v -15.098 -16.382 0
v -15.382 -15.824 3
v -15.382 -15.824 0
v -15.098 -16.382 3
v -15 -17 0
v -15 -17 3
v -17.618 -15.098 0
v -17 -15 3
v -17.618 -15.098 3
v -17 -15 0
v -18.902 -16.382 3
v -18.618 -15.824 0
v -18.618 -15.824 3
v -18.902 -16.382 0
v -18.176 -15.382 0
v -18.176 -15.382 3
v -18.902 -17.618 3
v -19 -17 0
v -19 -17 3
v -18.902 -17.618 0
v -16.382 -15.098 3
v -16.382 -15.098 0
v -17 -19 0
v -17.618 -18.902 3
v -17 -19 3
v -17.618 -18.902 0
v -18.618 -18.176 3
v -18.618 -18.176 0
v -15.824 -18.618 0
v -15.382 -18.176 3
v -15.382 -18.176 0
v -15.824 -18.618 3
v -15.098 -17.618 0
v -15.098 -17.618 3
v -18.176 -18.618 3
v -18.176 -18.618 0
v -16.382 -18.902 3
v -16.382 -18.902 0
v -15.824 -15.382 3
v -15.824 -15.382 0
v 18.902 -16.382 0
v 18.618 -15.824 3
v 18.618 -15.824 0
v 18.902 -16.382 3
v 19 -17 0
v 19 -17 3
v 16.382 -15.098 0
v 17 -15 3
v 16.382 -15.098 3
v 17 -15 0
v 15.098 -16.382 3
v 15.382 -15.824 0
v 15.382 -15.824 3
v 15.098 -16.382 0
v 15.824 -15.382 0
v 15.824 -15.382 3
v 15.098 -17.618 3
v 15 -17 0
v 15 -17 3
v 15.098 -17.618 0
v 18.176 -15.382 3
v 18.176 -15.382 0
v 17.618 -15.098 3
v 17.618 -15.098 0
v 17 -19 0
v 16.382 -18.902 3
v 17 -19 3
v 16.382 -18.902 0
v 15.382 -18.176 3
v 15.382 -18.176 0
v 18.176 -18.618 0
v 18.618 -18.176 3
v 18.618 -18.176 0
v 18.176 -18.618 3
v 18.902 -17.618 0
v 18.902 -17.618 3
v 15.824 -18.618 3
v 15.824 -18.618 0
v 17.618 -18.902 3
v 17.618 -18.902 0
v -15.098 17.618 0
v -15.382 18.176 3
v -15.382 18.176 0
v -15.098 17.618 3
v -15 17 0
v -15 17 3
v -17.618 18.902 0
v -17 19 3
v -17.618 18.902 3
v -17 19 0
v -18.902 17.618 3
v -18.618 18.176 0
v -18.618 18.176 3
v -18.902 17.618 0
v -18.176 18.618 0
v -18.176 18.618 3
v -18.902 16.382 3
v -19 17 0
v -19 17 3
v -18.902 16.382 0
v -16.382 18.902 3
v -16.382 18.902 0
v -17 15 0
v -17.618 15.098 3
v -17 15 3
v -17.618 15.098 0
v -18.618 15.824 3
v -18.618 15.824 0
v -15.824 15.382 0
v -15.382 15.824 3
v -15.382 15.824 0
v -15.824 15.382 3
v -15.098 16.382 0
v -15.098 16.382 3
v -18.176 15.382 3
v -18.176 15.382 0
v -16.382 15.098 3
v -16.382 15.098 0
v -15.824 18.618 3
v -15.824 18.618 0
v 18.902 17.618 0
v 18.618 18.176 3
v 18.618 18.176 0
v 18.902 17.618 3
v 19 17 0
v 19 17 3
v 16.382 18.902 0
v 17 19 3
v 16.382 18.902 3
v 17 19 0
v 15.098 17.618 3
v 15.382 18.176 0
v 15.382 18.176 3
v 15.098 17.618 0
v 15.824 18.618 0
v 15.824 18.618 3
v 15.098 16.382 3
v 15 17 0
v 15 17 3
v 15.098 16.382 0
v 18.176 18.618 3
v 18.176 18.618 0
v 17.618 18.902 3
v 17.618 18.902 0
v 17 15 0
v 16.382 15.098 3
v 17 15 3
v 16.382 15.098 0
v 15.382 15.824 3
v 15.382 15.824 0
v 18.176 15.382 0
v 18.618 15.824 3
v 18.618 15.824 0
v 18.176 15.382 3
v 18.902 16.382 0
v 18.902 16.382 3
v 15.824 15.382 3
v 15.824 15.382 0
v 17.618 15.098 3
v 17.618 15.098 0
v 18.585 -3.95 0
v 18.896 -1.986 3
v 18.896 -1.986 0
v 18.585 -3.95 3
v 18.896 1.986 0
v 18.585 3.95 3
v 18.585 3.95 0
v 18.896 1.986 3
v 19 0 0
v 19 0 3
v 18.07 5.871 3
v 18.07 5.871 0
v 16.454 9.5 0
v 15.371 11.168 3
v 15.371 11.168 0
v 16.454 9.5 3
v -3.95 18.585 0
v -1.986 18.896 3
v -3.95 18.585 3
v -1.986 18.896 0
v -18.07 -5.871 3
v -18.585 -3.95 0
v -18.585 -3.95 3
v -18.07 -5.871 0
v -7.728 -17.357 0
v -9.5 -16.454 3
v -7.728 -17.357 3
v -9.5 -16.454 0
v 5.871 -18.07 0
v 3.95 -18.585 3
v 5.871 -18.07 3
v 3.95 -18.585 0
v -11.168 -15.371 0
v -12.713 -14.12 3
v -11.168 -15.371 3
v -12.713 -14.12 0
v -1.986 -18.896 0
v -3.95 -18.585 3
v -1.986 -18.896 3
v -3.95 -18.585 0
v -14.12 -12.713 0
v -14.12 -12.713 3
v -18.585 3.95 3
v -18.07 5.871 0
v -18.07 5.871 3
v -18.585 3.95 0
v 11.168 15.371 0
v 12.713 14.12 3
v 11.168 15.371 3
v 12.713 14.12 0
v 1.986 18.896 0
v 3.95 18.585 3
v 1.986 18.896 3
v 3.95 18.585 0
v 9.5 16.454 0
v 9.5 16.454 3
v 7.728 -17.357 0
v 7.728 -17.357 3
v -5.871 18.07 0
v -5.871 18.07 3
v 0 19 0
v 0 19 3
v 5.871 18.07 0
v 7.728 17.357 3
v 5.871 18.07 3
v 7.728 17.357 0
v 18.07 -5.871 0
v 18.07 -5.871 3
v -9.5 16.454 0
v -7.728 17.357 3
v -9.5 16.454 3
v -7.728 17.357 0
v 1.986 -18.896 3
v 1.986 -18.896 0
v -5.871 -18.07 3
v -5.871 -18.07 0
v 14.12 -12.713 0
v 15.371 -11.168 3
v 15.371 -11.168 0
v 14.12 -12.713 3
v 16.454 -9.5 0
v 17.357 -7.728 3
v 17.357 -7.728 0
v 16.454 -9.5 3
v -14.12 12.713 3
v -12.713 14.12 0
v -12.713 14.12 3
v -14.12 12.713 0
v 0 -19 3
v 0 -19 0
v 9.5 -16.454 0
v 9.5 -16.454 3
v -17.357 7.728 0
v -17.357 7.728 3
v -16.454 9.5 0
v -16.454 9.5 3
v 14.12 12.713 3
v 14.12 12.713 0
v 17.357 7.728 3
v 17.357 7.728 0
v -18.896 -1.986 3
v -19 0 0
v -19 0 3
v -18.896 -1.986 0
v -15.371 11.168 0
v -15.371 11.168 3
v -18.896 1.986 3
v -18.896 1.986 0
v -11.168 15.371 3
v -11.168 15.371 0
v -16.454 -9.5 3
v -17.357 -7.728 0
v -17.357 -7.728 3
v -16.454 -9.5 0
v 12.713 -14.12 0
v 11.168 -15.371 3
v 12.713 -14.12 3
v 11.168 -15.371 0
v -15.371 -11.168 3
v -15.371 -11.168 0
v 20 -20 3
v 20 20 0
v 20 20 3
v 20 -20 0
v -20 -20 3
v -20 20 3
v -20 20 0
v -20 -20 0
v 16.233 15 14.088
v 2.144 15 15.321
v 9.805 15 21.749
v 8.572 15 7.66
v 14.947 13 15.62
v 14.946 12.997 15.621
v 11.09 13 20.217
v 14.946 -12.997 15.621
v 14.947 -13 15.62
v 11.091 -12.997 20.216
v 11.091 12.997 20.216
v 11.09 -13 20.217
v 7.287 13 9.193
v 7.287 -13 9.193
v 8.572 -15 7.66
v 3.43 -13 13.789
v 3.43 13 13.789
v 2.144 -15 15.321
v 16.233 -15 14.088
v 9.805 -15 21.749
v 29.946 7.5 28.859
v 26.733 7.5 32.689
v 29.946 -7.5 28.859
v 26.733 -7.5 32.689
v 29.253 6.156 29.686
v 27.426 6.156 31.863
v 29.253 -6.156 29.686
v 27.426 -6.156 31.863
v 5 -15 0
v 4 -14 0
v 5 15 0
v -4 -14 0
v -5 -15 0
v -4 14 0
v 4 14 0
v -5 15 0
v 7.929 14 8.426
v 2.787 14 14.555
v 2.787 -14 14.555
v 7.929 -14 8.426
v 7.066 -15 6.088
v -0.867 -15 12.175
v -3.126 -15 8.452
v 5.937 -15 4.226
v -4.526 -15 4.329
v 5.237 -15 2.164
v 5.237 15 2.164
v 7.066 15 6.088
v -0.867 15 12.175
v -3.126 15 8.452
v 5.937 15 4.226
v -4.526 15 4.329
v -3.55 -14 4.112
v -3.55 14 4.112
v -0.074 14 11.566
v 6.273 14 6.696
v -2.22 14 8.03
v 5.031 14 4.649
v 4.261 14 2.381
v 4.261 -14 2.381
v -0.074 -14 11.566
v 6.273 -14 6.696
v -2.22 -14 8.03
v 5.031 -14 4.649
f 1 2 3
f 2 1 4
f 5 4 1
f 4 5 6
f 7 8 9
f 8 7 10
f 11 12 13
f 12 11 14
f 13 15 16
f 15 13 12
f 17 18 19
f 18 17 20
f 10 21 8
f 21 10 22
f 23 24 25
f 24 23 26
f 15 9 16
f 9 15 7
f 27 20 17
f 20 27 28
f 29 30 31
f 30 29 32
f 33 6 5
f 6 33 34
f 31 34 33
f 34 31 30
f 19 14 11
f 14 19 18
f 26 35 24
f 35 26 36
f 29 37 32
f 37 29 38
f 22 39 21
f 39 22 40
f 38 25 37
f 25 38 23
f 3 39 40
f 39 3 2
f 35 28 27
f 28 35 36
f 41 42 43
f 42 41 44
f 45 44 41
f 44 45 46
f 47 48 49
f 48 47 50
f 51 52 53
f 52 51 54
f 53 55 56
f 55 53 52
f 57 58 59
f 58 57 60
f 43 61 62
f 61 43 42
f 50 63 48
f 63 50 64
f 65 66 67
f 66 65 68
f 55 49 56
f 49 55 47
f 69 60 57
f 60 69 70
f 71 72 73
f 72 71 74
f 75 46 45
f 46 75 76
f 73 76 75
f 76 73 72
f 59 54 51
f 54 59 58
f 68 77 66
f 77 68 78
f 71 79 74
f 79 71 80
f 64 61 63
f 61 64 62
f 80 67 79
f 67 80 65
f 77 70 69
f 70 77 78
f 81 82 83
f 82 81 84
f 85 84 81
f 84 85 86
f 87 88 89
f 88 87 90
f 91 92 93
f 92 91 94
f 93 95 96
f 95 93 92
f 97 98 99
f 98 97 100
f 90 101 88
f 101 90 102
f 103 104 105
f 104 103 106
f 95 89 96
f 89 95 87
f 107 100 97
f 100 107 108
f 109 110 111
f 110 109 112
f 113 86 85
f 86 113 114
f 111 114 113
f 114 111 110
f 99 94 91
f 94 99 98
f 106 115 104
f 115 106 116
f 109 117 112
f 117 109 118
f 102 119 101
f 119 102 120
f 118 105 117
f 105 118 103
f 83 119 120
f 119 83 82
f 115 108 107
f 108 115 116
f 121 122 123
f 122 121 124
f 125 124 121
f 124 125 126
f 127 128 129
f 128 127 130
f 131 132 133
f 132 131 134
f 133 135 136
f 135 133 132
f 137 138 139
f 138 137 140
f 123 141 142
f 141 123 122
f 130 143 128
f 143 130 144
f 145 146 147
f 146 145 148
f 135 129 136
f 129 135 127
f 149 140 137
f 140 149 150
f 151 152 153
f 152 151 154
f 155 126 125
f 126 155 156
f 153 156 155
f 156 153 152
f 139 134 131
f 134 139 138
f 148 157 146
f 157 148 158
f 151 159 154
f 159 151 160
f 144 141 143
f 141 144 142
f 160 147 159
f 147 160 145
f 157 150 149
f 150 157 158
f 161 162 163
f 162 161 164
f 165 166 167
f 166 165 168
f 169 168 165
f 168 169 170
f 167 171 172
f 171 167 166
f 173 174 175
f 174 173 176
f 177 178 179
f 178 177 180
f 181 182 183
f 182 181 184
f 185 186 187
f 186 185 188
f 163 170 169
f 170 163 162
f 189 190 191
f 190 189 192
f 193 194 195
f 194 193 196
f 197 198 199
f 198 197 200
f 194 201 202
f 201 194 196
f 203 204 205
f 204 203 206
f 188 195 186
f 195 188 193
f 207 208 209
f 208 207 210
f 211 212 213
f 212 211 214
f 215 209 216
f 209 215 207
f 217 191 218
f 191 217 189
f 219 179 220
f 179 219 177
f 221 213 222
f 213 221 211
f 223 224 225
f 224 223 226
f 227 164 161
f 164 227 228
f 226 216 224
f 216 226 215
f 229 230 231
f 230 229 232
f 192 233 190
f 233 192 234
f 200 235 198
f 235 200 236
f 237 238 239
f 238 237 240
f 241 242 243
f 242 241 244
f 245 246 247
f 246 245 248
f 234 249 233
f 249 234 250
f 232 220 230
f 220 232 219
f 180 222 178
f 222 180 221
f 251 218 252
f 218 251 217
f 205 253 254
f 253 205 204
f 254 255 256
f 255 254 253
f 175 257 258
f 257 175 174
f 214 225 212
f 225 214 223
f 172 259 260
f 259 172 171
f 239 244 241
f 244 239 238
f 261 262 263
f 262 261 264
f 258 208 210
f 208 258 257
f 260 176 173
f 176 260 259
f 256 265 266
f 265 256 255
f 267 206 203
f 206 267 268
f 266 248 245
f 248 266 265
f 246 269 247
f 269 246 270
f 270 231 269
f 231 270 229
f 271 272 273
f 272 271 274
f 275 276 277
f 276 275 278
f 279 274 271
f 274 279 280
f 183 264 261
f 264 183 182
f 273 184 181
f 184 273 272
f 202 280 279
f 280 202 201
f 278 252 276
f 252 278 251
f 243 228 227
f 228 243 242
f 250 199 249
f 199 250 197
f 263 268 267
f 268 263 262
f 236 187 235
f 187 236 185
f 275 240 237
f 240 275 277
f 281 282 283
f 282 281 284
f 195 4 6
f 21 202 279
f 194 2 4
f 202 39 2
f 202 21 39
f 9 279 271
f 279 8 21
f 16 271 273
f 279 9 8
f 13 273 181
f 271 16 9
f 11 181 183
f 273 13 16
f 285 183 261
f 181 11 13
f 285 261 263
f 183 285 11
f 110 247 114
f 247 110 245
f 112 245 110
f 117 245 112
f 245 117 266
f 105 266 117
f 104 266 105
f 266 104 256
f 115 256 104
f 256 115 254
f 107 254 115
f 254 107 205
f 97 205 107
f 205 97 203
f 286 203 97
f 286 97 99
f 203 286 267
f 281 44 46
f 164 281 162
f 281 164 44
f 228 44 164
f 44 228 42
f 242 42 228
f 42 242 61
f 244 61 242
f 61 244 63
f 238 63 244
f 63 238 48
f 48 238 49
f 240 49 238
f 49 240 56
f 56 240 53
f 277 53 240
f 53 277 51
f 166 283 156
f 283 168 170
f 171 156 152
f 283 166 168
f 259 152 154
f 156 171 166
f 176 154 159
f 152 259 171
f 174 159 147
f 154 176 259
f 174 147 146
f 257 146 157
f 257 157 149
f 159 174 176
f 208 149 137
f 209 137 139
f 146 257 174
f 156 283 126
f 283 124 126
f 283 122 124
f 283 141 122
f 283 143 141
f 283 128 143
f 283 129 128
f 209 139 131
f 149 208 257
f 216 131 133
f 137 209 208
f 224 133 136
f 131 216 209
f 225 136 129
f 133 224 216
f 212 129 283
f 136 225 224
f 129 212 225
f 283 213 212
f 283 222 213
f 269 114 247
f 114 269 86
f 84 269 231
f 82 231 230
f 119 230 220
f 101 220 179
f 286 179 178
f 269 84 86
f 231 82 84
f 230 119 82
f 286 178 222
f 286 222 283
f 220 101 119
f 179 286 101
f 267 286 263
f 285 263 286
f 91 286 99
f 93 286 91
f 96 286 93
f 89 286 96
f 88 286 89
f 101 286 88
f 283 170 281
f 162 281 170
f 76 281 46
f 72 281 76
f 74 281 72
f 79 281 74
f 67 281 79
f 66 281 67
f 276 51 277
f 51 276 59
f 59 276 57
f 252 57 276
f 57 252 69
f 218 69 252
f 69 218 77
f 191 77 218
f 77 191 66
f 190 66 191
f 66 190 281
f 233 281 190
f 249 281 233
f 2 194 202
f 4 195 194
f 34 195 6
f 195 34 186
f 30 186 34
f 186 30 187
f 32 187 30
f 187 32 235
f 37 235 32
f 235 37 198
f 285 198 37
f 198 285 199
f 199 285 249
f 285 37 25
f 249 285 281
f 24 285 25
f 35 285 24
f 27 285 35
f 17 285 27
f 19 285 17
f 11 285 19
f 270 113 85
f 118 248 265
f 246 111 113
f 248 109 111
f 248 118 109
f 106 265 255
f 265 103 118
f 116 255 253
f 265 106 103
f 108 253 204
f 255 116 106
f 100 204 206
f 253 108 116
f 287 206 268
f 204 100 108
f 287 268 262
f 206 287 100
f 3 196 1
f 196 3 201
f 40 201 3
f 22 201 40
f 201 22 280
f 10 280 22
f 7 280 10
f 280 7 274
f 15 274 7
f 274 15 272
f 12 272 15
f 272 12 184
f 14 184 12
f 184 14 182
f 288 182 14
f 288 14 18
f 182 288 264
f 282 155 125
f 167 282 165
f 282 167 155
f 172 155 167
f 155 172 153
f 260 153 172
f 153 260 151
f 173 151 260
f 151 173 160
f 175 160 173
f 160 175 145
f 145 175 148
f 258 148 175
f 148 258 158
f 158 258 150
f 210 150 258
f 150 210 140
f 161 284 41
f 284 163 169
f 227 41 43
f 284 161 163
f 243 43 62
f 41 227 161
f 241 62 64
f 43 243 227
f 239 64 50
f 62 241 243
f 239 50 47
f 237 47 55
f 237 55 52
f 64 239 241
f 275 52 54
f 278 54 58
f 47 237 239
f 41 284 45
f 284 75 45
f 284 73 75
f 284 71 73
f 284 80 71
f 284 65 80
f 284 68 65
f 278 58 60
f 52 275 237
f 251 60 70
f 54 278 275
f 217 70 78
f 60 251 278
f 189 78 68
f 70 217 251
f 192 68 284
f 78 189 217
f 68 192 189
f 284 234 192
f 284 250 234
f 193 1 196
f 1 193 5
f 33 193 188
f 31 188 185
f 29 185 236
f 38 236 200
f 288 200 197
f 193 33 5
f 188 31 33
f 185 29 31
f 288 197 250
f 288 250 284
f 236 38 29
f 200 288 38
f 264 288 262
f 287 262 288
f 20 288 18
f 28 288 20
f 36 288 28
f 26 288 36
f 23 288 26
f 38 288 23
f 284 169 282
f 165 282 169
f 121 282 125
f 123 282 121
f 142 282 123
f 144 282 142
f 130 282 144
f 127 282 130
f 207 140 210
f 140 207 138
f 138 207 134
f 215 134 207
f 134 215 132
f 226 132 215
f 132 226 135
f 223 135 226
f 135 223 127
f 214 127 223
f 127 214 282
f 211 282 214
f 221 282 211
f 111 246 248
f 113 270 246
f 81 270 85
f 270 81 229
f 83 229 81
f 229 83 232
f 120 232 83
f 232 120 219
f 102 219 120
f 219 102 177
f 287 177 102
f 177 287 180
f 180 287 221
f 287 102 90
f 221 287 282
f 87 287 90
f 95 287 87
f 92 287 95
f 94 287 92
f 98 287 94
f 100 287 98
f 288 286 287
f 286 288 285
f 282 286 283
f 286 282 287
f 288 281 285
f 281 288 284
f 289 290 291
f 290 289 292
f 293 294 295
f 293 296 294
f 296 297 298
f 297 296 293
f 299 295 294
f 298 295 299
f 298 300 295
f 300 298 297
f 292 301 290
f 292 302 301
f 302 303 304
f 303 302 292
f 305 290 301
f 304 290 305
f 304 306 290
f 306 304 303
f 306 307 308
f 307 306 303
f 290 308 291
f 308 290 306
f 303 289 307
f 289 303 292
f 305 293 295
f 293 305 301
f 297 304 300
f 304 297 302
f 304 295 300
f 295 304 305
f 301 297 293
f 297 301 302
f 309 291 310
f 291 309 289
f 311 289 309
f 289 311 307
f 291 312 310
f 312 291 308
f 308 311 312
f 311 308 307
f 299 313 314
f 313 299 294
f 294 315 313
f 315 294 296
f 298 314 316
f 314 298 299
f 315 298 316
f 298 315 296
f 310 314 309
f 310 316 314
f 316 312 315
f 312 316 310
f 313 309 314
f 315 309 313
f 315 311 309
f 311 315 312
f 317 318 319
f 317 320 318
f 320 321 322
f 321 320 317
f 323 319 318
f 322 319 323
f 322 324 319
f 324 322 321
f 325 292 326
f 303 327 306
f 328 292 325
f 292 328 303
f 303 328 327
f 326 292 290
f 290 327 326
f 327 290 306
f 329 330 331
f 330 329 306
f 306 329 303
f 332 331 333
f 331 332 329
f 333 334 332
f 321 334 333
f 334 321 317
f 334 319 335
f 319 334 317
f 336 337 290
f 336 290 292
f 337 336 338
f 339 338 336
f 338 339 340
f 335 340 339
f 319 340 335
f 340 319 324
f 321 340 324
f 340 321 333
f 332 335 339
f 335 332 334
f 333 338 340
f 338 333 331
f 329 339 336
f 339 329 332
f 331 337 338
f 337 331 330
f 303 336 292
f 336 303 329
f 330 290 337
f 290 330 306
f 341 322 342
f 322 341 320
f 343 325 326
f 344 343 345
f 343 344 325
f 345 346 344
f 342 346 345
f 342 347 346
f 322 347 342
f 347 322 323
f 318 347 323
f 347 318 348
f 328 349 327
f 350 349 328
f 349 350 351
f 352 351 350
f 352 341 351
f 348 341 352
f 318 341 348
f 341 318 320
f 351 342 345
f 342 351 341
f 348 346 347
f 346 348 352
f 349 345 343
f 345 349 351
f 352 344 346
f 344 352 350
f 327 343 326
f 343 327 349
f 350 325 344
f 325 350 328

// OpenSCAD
// file: ../primitives/bent.scad
use <../math/vect.scad>

// x = 10;
// y = 40;
// r = 30;
// angle = 90;
// bent_tube([x, y], [8, 28], angle, r);
// rotate_to_bent_face(x, angle, r){
//     cube([20, 40, 40]);
// }


module bent_2d(angle, r){
    mirror([0, 1 ,0])
    mirror([1, 0, 0])
        rotate([90, 0, 0])
            //translate([-r, 0])
                rotate_extrude(convexity = 10, angle = angle){
                    translate([r, 0])
                        children();
                }
}


module bent_cube(size, angle, r){
    translate([size[0] + r, 0, 0])
        bent_2d(angle, r)
            square([size[0], size[1]]);
}

// bent_tube([10, 50], [8, 48], 90, 20);

module bent_tube(size, size1, angle, r){
    translate([size[0] + r, 0, 0])
        bent_2d(angle, r){
            difference(){
                square([size[0], size[1]]);
                    translate([(size[0] - size1[0])/2, (size[1] - size1[1])/2])
                        square([size1[0], size1[1]]);
            }
        }
}

module rotate_to_bent_face(x, angle, r){
    offset = r + x;
    translate([offset, 0, 0])
        rotate([0, angle, 0])
            translate([ - offset, 0])
                children();
}
x = 10;
y = 40;
r = 30;
angle = 90;
bent_tube([x, y], [8, 28], angle, r);
rotate_to_bent_face(x, angle, r){
    cube([20, 40, 40]);
}

// rotate_extrude(convexity = 10, angle = 90)
// square([10, 20]);

// mirror([1, 0, 0])
// angle = 45;
// rotate([-90, 0, 0])
// rotate_extrude(convexity = 10, angle = angle)
// translate ([-30, 0])
// polygon([[15,10], [30,10], [15, 15]]);
// file: ../connectors/simple_rotating_connector.scad
use <../primitives/bent.scad>
use <../math/align.scad>
module simple_rotating_connector(size, wall_size, angle, r, center = false){
    x = size[0];
    y = size[1];

    align_center([x, y, 0], center)
        bent_tube([x, y], [x - wall_size, y - wall_size], angle, r);
            rotate_to_bent_face(x, angle, r)
                children();
}
// file: ../coolers/cooler.scad
h = 50;
poly_n = 20;
use <../math/align.scad>;

module cooler_screw_holes(sizes, hole_d, height = h){
    r = hole_d / 2;
    align_center(sizes){
        translate([r, r, 0]){
            cylinder(sizes[2], r1 = r, r2 = r, center = false, $fn=poly_n);
        }
        translate([sizes[0] - r, r, 0]){
            cylinder(sizes[2], r1 = r, r2 = r, center = false, $fn=poly_n);
        }
        translate([r, sizes[1] - r, 0]){
            cylinder(sizes[2], r1 = r, r2 = r, center = false, $fn=poly_n);
        }
        translate([sizes[0] - r, sizes[1] - r, 0]){
            cylinder(sizes[2], r1 = r, r2 = r, center = false, $fn=poly_n);
        }
    }
}


function _map_sizes(size) =
    (size == 40) ? [38, 38, 4]:
    (size == 50) ? [48, 48, 4]: -1;

module cooler_main_hole(r){
    cylinder(h, r / 2, r / 2, $fn=poly_n * 3);
}

module standard_cooler_screw_holes(size){
    size = _map_sizes(size);
    group(){
        cooler_screw_holes([size[0], size[0], h], size[2]);
        cooler_main_hole(size[1]);
    }
}

module standard_cooler_plate(size, h=3){
    difference(){
        align_center(size){
            cube([size, size, h]);
        }
        translate([0,0, -1]){
            standard_cooler_screw_holes(size);
        }
    }
}

standard_cooler_plate(40);
// file: ../math/align.scad
use <vect.scad>
module align_center(sizes, center = true, centerZ = false){
    sizes = vSize(sizes);
    if (center){
        translate([-sizes[0] / 2, -sizes[1] / 2, (centerZ ? -sizes[2]/2 : 0)]){
            children();
        }
    } else {
        children();
    }   
}

module align_uncenter(sizes, uncenter = true, uncenterZ = false){
    sizes = vSize(sizes);
    if (uncenter){
        translate([sizes[0] / 2, sizes[1] / 2, (uncenterZ ? sizes[2]/2 : 0)]){
            children();
        }
    } else {
        children();
    }   
}


// align_center(20){
//     align_uncenter(20){
//         cube(20);
//     }
// }
// file: ../math/vect.scad
function vect_scalar_sum(v, incr) = [for (i = [0: len(v) - 1]) v[i] + incr];

function vSize(size) = (!is_list(size)) ? [size, size, size]: size; 

function vect_rotate2d(vect, b) = [
    cos(b) * vect[0] - sin(b) * vect[1],
    sin(b) * vect[0] + cos(b) * vect[1]
];
// file: ../primitives/pyramid.scad
use <../math/align.scad>
module pyramid3(size, heiht, center = false, r=0){
    // center = [size[0] / 2, size[1] / 2, size[2] / 2]
    // points = [[ 0, 0, 0], [size[0], 0, 0], [ 0, size[1], 0],
    //       [ 0, 0, 0], [size[0], 0, 0], [ 0, size[1], 0],
    //       [ 0, size[1], 0], [size[0], 0, 0], [ 0, 0, size[2]],
    //       [ 0, 0, 0], [ 0, 0, size[2]], [size[0], 0, 0],
    //       [ 0, 0, 0], [ 0, size[1], 0], [ 0, 0, size[2]]];
    // faces = [[0,1,2], [3,4,5], [6,7,8], [9,10,11], [12,13,14]];
    // polyhedron(points, faces);
}

//
//
//

module pyramid4(sizes, center){
    align_uncenter(sizes, !center){
        size = [sizes[0] / 2 , sizes[1] / 2, sizes[2]];
        polyhedron(
        points=[ 
            [size[0],size[1],0],
            [size[0],-size[1],0],
            [-size[0],-size[1],0],
            [-size[0],size[1],0], // the four points at base
            [0,0,size[2]]  
        ],                                 // the apex point 
        faces=[ 
            [0,1,4],
            [1,2,4],
            [2,3,4],
            [3,0,4],              // each triangle side
            [1,0,3],
            [2,1,3] 
        ]                         // two triangles for square base
        );
    }
}

//
// 
// truncated_pyramid4([20, 20, 30], [5, 5], center = false);
//
module truncated_pyramid4(sizes, top_sizes, center = true){
    align_uncenter(sizes, !center){
        size = [sizes[0] / 2 , sizes[1] / 2, sizes[2]];
        top_size = [top_sizes[0] / 2 , top_sizes[1] / 2];
        h = size[2];
        polyhedron(
        points=[ 
            [size[0], size[1], 0],
            [size[0], -size[1], 0],
            [-size[0], -size[1], 0],
            [-size[0], size[1], 0], // the four points at base

            [top_size[0], top_size[1], h],
            [top_size[0], -top_size[1], h],
            [-top_size[0], -top_size[1], h],
            [-top_size[0], top_size[1], h],
        ],                                 // the apex point 
        faces=[ 
            [0, 1, 2, 3],
            [0, 1, 5, 4],
            [1, 2, 6, 5],
            [2, 3, 7, 6],
            [3, 0, 4, 7],
            [4, 5, 6, 7]
        ]);
    }
}

truncated_pyramid4([20, 20, 30], [5, 5], center = true);
// file: ../primitives/box.scad
module cube_round(size, center = false, r=0){
    sx = size[0] - 2 * r;
    sy = size[1] - 2 * r;
    sz = size[2] - 2 * r;
    translate([r, r, r]) hull() {
        for (offset=[[0, 0, 0],
                     [0, 0, sz],
                     [0, sy, sz],
                     [0, sy, 0],
                     [sx, sy, 0],
                     [sx, sy, sz],
                     [sx, 0, sz],
                     [sx, 0, 0]])
        {
            translate(offset) sphere(r);
        }
    }
}

module cube_hole(size, wallWidth, center = false){
    if (!center){
        translate([size[0] / 2, size[1] / 2, size[2] / 2]){
            _cube_hole_centered(size, wallWidth);
        }
    } else {
        _cube_hole_centered(size, wallWidth);
    }
}

module _cube_hole_centered(size, wallWidth){
    iSize = [size[0] - wallWidth * 2, size[1] - wallWidth * 2, size[2] + 1];
    difference(){
        cube(size, center = true);
        cube(iSize, center = true);
    }
}


cube_round([200,200,200], r=4);
// main file
use <../primitives/box.scad>;
use <../primitives/pyramid.scad>;
use <../math/vect.scad>;
use <../math/align.scad>;
use <../coolers/cooler.scad>;
use <../connectors/simple_rotating_connector.scad>;

module bent_nozzle(size, wallWidth){
    dx = 0.01;

    boxH = size[2] * 1 / 3;
    nozzleFullH = (size[2] - boxH) * 2;
    nozzleSize = [size[0], size[1], nozzleFullH];
    nozzleHeight = nozzleFullH / 2;

    module nozzle(nozzleSize){
        difference(){
            pyramid4(nozzleSize, center = false);
            nozzleSize1 = vect_scalar_sum(nozzleSize, -wallWidth);
            nozzleSizeM = [nozzleSize1[0] - wallWidth, nozzleSize1[1] - wallWidth, nozzleSize1[2] + dx];
            translate([wallWidth, wallWidth, - dx]){
                pyramid4(nozzleSizeM, center = false);
            }
        }
    }

    module truncated_nozzle(nozzleSize){
        difference(){
            nozzle(nozzleSize);
            translate([0, 0, nozzleHeight]){
                cube(nozzleSize);
            }
        }
    }
    module nozzle_head(){
        align_center(size, centerZ = false){
            boxSize = [size[0], size[1], boxH];
            cube_hole(boxSize, wallWidth, center = false);
            translate([0, 0, boxH]){ 
                truncated_nozzle(nozzleSize);    
            }
        }
    }


    standard_cooler_plate(40);

    align_center([size[1], size[0]])
        simple_rotating_connector([size[1], size[0]], wallWidth, 50, 10, false)
            translate([size[1], 0])
            rotate([0, 0, 90])
                align_uncenter([size[0], size[1]])
                    nozzle_head();
        

}

size = [30, 10, 30];
wallWidth = 2;

bent_nozzle(size, wallWidth);
